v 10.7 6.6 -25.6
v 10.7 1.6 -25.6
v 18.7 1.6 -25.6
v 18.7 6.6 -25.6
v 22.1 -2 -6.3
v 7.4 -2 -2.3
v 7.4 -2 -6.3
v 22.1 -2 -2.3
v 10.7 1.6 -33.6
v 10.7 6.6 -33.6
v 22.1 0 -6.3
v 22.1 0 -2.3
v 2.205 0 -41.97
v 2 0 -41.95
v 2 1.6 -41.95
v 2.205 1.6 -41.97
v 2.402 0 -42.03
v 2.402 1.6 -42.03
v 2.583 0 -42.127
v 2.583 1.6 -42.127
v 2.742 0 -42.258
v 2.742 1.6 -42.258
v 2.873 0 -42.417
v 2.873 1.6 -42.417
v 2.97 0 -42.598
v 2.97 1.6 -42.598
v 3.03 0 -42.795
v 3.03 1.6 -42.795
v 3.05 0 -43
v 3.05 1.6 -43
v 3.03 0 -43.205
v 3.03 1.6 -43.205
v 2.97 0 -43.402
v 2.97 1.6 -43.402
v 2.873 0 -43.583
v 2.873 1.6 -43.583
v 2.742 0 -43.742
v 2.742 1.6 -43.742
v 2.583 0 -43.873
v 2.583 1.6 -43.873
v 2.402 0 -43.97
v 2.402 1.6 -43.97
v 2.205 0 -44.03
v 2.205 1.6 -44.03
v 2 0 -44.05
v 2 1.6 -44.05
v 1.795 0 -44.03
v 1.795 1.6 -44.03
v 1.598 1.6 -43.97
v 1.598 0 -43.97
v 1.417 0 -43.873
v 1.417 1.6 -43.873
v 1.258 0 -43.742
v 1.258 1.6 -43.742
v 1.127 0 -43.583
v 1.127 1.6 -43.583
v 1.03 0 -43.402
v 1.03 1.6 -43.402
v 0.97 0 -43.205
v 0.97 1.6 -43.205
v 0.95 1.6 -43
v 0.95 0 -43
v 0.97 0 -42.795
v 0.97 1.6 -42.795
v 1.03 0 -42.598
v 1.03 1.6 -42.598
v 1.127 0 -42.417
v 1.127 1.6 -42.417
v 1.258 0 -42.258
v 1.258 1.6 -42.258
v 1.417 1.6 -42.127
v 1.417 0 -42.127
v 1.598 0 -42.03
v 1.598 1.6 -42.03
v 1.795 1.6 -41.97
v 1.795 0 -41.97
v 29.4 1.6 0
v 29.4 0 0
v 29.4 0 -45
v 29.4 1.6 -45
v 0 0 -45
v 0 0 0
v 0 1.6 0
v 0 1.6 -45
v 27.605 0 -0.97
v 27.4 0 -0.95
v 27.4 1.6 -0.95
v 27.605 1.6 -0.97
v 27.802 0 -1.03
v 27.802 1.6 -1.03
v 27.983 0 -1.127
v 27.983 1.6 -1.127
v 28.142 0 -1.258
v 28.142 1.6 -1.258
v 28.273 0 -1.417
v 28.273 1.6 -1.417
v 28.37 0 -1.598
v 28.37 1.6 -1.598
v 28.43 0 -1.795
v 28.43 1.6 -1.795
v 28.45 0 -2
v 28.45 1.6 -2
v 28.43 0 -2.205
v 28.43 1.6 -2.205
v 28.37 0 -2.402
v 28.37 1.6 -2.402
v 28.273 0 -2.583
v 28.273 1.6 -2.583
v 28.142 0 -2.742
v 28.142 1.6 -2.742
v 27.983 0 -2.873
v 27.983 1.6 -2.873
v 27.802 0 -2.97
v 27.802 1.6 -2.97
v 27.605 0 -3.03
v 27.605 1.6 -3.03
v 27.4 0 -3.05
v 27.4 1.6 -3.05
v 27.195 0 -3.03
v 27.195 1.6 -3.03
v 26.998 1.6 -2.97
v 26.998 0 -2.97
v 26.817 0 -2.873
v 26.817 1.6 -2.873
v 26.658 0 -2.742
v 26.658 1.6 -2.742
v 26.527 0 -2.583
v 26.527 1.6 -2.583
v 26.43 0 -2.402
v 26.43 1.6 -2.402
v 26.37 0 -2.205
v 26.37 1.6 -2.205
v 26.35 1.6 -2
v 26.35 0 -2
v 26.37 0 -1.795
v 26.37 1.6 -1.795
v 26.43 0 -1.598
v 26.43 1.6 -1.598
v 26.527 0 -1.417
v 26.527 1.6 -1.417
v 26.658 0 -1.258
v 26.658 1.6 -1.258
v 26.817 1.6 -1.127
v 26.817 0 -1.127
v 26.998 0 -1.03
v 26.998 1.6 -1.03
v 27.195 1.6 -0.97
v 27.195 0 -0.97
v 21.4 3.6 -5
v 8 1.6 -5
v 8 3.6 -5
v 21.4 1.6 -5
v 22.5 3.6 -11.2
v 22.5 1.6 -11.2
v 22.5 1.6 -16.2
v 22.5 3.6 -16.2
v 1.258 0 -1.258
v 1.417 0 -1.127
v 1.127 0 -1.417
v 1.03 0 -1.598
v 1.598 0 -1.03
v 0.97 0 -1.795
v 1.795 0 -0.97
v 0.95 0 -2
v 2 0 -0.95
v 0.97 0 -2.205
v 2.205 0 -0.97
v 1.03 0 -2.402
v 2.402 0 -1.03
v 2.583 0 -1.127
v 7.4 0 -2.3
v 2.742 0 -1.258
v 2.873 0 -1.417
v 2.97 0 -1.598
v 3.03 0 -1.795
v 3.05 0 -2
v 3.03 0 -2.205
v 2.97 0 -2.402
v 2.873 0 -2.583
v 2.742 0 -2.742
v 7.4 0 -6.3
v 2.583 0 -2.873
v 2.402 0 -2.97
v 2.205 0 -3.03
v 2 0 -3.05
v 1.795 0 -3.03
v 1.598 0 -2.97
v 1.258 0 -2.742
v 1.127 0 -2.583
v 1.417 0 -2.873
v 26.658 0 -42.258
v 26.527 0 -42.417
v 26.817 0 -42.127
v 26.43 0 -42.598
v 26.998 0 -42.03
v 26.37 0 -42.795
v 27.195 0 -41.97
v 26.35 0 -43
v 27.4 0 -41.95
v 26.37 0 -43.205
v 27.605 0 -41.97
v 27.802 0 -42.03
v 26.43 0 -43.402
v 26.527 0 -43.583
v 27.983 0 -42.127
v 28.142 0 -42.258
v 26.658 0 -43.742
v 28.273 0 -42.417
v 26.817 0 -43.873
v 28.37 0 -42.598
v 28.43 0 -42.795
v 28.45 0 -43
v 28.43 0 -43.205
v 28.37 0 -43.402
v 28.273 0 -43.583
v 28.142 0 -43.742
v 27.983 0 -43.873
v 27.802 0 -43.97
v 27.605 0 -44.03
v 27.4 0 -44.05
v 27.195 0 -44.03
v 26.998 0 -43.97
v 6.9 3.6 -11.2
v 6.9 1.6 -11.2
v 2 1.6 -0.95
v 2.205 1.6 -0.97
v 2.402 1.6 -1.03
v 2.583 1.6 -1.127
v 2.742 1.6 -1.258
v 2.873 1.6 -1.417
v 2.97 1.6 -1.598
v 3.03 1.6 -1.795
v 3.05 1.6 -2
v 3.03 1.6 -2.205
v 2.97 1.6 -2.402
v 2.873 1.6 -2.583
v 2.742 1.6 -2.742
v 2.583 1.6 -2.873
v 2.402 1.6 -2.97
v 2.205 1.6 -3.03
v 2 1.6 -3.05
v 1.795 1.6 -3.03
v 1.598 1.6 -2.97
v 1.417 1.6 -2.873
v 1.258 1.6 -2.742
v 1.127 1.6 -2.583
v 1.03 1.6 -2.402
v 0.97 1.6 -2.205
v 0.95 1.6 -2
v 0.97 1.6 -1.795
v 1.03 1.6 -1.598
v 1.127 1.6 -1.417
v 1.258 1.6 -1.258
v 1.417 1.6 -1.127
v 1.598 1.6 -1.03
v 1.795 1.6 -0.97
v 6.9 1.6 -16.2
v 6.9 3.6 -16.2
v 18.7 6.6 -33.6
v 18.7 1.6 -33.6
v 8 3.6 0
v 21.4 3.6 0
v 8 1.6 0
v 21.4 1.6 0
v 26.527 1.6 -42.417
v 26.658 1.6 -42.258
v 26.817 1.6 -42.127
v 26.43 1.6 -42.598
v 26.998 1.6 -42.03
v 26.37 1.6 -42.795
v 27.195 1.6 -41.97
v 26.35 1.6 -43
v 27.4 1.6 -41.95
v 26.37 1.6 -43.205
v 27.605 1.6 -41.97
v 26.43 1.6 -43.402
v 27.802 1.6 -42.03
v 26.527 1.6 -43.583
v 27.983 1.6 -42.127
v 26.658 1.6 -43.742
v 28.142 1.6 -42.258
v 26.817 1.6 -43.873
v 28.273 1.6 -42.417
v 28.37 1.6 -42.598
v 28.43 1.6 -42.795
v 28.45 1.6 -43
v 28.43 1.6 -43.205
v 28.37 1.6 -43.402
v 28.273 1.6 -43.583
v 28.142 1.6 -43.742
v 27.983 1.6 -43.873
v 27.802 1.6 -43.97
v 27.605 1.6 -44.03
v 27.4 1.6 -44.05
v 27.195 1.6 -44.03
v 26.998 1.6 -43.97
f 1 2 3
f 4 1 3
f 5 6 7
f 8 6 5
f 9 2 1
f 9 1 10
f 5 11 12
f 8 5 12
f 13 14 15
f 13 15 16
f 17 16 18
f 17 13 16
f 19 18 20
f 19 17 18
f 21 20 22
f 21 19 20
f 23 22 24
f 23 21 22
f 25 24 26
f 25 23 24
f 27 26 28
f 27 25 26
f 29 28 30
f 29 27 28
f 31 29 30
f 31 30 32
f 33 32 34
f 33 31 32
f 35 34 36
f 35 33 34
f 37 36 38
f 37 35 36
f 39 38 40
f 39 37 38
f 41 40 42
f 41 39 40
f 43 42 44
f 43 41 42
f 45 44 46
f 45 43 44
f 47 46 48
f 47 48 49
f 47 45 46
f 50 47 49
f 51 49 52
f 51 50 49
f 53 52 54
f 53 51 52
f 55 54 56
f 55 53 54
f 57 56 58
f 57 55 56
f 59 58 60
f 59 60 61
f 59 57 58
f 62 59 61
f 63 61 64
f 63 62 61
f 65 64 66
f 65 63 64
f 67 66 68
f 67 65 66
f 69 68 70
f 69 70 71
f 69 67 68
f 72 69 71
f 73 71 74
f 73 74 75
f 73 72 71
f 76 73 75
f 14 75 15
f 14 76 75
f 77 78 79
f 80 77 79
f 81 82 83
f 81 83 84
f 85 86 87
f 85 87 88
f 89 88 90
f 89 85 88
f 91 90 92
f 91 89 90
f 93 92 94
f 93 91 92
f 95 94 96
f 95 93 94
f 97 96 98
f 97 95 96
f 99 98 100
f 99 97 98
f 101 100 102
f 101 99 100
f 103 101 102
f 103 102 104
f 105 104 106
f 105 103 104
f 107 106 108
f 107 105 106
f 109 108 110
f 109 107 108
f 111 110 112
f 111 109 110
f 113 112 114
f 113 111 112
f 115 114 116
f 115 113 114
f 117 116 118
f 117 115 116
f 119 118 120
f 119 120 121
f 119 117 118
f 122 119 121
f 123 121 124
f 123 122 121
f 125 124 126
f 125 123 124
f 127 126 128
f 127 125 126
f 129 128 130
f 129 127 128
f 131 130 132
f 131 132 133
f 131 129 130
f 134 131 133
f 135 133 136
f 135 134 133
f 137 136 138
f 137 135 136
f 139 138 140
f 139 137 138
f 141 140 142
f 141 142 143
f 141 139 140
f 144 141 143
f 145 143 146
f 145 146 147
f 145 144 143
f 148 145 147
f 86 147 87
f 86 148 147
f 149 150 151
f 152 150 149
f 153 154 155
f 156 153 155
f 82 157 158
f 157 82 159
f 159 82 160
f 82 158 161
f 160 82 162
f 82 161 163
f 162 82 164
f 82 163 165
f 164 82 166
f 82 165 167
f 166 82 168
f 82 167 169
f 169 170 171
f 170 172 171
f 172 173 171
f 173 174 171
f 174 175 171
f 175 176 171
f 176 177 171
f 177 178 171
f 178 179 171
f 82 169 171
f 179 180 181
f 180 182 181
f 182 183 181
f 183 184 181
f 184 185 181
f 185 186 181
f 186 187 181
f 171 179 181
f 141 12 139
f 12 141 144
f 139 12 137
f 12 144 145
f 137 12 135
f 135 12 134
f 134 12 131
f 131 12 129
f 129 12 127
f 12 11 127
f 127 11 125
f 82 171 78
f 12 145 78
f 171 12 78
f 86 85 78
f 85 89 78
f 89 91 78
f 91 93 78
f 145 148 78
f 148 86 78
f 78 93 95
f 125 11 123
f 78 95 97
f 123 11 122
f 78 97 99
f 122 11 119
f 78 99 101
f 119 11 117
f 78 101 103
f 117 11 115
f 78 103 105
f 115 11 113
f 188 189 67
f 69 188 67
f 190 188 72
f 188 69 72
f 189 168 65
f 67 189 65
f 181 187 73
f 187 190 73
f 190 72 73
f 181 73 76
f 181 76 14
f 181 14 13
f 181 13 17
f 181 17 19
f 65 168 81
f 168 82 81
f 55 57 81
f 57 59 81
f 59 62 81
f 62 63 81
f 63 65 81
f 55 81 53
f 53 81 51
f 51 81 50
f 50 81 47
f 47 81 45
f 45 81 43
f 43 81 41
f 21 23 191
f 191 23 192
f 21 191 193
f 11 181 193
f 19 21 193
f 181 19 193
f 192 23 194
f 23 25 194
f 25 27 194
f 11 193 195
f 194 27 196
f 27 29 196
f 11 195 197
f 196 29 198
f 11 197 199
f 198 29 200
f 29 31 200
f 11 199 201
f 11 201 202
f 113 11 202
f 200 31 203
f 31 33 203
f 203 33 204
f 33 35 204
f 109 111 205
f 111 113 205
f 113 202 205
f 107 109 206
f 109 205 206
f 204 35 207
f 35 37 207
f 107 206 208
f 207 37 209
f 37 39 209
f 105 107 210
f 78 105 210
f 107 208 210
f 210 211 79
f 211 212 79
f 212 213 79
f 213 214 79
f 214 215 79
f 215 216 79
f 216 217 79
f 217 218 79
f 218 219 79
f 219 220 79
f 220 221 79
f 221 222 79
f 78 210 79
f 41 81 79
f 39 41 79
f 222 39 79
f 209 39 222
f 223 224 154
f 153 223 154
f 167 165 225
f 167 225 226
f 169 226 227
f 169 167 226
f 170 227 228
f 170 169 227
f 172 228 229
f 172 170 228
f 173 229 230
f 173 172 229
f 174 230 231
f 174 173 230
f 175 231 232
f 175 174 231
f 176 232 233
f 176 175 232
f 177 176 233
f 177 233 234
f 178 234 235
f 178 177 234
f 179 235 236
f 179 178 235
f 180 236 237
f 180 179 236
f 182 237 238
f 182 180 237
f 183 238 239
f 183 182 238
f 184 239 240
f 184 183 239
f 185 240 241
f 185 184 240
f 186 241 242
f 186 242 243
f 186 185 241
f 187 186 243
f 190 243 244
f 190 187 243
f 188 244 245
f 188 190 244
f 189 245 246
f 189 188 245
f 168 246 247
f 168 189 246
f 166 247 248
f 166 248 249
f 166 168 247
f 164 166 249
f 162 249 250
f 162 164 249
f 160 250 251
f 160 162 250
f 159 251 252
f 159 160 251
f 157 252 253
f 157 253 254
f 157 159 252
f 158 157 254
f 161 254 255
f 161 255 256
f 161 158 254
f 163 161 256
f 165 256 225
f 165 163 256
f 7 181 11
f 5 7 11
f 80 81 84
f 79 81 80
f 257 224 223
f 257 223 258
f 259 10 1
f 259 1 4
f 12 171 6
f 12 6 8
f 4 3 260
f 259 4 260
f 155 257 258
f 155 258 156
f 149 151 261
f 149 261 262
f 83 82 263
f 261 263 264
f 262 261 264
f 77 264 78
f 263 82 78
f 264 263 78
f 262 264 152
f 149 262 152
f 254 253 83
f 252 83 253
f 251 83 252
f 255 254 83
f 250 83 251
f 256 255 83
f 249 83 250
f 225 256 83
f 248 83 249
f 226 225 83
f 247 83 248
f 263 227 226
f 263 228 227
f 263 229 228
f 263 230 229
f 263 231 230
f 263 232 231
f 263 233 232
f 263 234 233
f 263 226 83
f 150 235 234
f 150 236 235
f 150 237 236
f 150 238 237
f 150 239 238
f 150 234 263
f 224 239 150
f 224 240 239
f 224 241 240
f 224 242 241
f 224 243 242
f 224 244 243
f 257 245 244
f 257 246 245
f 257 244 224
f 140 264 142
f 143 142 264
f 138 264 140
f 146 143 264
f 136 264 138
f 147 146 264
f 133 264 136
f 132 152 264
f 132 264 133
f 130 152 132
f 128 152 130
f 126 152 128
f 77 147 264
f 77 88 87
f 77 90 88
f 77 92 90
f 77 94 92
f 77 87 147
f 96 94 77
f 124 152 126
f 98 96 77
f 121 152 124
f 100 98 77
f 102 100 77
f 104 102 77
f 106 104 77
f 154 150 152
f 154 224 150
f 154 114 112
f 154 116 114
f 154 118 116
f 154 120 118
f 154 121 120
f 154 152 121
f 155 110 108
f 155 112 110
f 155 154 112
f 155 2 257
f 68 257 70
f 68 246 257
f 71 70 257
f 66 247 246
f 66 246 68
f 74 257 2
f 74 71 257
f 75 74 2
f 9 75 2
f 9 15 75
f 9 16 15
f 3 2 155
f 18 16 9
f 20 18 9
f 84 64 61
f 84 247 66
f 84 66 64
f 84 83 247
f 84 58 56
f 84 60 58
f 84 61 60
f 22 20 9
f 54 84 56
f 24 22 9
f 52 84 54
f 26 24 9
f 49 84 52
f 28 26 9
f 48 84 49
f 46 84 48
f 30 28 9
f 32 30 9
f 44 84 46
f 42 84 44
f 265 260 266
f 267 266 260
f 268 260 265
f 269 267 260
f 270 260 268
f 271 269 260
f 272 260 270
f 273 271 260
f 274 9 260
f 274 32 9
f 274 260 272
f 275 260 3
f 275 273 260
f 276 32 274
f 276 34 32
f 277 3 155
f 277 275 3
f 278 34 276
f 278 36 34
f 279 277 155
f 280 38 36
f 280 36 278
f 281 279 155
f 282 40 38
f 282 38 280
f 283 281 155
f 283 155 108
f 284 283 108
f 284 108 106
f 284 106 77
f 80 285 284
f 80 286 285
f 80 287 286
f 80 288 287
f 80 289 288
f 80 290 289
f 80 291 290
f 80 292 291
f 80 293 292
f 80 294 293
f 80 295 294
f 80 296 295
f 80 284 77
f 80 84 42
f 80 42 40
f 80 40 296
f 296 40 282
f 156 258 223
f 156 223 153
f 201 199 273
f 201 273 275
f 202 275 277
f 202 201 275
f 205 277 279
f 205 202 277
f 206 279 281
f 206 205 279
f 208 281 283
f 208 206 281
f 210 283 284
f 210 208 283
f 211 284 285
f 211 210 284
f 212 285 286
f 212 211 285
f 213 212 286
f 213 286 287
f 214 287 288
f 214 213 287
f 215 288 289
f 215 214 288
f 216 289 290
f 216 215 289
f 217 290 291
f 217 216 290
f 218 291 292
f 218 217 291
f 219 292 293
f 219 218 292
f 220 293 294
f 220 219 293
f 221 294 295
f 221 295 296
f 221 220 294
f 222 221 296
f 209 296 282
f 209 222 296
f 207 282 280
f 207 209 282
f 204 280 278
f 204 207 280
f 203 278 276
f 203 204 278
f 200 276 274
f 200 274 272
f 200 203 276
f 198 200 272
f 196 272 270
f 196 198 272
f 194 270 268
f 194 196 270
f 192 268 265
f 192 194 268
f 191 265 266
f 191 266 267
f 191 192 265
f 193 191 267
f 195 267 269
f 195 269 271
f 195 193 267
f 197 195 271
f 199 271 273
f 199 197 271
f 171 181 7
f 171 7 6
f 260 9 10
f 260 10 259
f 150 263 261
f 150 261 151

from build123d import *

# Parameters (mm, degrees)
SKETCH_2_W      = 29.4
SKETCH_2_H      = 45
SKETCH_2_R      = 1.05
EXTRUDE_1_DEPTH = 1.6
SKETCH_3_W      = 13.4
SKETCH_3_H      = 5
SKETCH_3_W_2    = 15.6
EXTRUDE_2_DEPTH = 2
SKETCH_4_W      = 14.7
SKETCH_4_H      = 4
EXTRUDE_3_DEPTH = 2
SKETCH_5_W      = 8
SKETCH_5_H      = 8
EXTRUDE_4_DEPTH = 5


with BuildPart() as part:
    # 草图2 → 凸台-拉伸1 (new body)
    with BuildSketch(Plane(origin=(0, 0, 0), x_dir=(1, 0, 0), z_dir=(0, 1, 0))):
        with Locations((14.7, 22.5)):
            Rectangle(SKETCH_2_W, SKETCH_2_H)
        with Locations(Location((2, 43, 0), (0, 0, 270))):
            Circle(SKETCH_2_R, mode=Mode.SUBTRACT)
        with Locations(Location((27.4, 43, 0), (0, 0, 270))):
            Circle(SKETCH_2_R, mode=Mode.SUBTRACT)
        with Locations(Location((2, 2, 0), (0, 0, 270))):
            Circle(SKETCH_2_R, mode=Mode.SUBTRACT)
        with Locations(Location((27.4, 2, 0), (0, 0, 270))):
            Circle(SKETCH_2_R, mode=Mode.SUBTRACT)
    extrude(amount=EXTRUDE_1_DEPTH)

    # 草图3 → 凸台-拉伸2 (add)
    with BuildSketch(Plane(origin=(0, 1.6, 0), x_dir=(1, 0, 0), z_dir=(0, 1, 0))):
        with Locations((14.7, 2.5)):
            Rectangle(SKETCH_3_W, SKETCH_3_H)
        with Locations((14.7, 13.7)):
            Rectangle(SKETCH_3_W_2, SKETCH_3_H)
    extrude(amount=EXTRUDE_2_DEPTH)

    # 草图4 → 凸台-拉伸3 (add)
    with BuildSketch(Plane.XZ):
        with Locations((14.75, -4.3)):
            Rectangle(SKETCH_4_W, SKETCH_4_H)
    extrude(amount=EXTRUDE_3_DEPTH)

    # 草图5 → 凸台-拉伸4 (add)
    with BuildSketch(Plane(origin=(0, 1.6, 0), x_dir=(1, 0, 0), z_dir=(0, 1, 0))):
        with Locations((14.7, 29.6)):
            Rectangle(SKETCH_5_W, SKETCH_5_H)
    extrude(amount=EXTRUDE_4_DEPTH)


solid = part.part
